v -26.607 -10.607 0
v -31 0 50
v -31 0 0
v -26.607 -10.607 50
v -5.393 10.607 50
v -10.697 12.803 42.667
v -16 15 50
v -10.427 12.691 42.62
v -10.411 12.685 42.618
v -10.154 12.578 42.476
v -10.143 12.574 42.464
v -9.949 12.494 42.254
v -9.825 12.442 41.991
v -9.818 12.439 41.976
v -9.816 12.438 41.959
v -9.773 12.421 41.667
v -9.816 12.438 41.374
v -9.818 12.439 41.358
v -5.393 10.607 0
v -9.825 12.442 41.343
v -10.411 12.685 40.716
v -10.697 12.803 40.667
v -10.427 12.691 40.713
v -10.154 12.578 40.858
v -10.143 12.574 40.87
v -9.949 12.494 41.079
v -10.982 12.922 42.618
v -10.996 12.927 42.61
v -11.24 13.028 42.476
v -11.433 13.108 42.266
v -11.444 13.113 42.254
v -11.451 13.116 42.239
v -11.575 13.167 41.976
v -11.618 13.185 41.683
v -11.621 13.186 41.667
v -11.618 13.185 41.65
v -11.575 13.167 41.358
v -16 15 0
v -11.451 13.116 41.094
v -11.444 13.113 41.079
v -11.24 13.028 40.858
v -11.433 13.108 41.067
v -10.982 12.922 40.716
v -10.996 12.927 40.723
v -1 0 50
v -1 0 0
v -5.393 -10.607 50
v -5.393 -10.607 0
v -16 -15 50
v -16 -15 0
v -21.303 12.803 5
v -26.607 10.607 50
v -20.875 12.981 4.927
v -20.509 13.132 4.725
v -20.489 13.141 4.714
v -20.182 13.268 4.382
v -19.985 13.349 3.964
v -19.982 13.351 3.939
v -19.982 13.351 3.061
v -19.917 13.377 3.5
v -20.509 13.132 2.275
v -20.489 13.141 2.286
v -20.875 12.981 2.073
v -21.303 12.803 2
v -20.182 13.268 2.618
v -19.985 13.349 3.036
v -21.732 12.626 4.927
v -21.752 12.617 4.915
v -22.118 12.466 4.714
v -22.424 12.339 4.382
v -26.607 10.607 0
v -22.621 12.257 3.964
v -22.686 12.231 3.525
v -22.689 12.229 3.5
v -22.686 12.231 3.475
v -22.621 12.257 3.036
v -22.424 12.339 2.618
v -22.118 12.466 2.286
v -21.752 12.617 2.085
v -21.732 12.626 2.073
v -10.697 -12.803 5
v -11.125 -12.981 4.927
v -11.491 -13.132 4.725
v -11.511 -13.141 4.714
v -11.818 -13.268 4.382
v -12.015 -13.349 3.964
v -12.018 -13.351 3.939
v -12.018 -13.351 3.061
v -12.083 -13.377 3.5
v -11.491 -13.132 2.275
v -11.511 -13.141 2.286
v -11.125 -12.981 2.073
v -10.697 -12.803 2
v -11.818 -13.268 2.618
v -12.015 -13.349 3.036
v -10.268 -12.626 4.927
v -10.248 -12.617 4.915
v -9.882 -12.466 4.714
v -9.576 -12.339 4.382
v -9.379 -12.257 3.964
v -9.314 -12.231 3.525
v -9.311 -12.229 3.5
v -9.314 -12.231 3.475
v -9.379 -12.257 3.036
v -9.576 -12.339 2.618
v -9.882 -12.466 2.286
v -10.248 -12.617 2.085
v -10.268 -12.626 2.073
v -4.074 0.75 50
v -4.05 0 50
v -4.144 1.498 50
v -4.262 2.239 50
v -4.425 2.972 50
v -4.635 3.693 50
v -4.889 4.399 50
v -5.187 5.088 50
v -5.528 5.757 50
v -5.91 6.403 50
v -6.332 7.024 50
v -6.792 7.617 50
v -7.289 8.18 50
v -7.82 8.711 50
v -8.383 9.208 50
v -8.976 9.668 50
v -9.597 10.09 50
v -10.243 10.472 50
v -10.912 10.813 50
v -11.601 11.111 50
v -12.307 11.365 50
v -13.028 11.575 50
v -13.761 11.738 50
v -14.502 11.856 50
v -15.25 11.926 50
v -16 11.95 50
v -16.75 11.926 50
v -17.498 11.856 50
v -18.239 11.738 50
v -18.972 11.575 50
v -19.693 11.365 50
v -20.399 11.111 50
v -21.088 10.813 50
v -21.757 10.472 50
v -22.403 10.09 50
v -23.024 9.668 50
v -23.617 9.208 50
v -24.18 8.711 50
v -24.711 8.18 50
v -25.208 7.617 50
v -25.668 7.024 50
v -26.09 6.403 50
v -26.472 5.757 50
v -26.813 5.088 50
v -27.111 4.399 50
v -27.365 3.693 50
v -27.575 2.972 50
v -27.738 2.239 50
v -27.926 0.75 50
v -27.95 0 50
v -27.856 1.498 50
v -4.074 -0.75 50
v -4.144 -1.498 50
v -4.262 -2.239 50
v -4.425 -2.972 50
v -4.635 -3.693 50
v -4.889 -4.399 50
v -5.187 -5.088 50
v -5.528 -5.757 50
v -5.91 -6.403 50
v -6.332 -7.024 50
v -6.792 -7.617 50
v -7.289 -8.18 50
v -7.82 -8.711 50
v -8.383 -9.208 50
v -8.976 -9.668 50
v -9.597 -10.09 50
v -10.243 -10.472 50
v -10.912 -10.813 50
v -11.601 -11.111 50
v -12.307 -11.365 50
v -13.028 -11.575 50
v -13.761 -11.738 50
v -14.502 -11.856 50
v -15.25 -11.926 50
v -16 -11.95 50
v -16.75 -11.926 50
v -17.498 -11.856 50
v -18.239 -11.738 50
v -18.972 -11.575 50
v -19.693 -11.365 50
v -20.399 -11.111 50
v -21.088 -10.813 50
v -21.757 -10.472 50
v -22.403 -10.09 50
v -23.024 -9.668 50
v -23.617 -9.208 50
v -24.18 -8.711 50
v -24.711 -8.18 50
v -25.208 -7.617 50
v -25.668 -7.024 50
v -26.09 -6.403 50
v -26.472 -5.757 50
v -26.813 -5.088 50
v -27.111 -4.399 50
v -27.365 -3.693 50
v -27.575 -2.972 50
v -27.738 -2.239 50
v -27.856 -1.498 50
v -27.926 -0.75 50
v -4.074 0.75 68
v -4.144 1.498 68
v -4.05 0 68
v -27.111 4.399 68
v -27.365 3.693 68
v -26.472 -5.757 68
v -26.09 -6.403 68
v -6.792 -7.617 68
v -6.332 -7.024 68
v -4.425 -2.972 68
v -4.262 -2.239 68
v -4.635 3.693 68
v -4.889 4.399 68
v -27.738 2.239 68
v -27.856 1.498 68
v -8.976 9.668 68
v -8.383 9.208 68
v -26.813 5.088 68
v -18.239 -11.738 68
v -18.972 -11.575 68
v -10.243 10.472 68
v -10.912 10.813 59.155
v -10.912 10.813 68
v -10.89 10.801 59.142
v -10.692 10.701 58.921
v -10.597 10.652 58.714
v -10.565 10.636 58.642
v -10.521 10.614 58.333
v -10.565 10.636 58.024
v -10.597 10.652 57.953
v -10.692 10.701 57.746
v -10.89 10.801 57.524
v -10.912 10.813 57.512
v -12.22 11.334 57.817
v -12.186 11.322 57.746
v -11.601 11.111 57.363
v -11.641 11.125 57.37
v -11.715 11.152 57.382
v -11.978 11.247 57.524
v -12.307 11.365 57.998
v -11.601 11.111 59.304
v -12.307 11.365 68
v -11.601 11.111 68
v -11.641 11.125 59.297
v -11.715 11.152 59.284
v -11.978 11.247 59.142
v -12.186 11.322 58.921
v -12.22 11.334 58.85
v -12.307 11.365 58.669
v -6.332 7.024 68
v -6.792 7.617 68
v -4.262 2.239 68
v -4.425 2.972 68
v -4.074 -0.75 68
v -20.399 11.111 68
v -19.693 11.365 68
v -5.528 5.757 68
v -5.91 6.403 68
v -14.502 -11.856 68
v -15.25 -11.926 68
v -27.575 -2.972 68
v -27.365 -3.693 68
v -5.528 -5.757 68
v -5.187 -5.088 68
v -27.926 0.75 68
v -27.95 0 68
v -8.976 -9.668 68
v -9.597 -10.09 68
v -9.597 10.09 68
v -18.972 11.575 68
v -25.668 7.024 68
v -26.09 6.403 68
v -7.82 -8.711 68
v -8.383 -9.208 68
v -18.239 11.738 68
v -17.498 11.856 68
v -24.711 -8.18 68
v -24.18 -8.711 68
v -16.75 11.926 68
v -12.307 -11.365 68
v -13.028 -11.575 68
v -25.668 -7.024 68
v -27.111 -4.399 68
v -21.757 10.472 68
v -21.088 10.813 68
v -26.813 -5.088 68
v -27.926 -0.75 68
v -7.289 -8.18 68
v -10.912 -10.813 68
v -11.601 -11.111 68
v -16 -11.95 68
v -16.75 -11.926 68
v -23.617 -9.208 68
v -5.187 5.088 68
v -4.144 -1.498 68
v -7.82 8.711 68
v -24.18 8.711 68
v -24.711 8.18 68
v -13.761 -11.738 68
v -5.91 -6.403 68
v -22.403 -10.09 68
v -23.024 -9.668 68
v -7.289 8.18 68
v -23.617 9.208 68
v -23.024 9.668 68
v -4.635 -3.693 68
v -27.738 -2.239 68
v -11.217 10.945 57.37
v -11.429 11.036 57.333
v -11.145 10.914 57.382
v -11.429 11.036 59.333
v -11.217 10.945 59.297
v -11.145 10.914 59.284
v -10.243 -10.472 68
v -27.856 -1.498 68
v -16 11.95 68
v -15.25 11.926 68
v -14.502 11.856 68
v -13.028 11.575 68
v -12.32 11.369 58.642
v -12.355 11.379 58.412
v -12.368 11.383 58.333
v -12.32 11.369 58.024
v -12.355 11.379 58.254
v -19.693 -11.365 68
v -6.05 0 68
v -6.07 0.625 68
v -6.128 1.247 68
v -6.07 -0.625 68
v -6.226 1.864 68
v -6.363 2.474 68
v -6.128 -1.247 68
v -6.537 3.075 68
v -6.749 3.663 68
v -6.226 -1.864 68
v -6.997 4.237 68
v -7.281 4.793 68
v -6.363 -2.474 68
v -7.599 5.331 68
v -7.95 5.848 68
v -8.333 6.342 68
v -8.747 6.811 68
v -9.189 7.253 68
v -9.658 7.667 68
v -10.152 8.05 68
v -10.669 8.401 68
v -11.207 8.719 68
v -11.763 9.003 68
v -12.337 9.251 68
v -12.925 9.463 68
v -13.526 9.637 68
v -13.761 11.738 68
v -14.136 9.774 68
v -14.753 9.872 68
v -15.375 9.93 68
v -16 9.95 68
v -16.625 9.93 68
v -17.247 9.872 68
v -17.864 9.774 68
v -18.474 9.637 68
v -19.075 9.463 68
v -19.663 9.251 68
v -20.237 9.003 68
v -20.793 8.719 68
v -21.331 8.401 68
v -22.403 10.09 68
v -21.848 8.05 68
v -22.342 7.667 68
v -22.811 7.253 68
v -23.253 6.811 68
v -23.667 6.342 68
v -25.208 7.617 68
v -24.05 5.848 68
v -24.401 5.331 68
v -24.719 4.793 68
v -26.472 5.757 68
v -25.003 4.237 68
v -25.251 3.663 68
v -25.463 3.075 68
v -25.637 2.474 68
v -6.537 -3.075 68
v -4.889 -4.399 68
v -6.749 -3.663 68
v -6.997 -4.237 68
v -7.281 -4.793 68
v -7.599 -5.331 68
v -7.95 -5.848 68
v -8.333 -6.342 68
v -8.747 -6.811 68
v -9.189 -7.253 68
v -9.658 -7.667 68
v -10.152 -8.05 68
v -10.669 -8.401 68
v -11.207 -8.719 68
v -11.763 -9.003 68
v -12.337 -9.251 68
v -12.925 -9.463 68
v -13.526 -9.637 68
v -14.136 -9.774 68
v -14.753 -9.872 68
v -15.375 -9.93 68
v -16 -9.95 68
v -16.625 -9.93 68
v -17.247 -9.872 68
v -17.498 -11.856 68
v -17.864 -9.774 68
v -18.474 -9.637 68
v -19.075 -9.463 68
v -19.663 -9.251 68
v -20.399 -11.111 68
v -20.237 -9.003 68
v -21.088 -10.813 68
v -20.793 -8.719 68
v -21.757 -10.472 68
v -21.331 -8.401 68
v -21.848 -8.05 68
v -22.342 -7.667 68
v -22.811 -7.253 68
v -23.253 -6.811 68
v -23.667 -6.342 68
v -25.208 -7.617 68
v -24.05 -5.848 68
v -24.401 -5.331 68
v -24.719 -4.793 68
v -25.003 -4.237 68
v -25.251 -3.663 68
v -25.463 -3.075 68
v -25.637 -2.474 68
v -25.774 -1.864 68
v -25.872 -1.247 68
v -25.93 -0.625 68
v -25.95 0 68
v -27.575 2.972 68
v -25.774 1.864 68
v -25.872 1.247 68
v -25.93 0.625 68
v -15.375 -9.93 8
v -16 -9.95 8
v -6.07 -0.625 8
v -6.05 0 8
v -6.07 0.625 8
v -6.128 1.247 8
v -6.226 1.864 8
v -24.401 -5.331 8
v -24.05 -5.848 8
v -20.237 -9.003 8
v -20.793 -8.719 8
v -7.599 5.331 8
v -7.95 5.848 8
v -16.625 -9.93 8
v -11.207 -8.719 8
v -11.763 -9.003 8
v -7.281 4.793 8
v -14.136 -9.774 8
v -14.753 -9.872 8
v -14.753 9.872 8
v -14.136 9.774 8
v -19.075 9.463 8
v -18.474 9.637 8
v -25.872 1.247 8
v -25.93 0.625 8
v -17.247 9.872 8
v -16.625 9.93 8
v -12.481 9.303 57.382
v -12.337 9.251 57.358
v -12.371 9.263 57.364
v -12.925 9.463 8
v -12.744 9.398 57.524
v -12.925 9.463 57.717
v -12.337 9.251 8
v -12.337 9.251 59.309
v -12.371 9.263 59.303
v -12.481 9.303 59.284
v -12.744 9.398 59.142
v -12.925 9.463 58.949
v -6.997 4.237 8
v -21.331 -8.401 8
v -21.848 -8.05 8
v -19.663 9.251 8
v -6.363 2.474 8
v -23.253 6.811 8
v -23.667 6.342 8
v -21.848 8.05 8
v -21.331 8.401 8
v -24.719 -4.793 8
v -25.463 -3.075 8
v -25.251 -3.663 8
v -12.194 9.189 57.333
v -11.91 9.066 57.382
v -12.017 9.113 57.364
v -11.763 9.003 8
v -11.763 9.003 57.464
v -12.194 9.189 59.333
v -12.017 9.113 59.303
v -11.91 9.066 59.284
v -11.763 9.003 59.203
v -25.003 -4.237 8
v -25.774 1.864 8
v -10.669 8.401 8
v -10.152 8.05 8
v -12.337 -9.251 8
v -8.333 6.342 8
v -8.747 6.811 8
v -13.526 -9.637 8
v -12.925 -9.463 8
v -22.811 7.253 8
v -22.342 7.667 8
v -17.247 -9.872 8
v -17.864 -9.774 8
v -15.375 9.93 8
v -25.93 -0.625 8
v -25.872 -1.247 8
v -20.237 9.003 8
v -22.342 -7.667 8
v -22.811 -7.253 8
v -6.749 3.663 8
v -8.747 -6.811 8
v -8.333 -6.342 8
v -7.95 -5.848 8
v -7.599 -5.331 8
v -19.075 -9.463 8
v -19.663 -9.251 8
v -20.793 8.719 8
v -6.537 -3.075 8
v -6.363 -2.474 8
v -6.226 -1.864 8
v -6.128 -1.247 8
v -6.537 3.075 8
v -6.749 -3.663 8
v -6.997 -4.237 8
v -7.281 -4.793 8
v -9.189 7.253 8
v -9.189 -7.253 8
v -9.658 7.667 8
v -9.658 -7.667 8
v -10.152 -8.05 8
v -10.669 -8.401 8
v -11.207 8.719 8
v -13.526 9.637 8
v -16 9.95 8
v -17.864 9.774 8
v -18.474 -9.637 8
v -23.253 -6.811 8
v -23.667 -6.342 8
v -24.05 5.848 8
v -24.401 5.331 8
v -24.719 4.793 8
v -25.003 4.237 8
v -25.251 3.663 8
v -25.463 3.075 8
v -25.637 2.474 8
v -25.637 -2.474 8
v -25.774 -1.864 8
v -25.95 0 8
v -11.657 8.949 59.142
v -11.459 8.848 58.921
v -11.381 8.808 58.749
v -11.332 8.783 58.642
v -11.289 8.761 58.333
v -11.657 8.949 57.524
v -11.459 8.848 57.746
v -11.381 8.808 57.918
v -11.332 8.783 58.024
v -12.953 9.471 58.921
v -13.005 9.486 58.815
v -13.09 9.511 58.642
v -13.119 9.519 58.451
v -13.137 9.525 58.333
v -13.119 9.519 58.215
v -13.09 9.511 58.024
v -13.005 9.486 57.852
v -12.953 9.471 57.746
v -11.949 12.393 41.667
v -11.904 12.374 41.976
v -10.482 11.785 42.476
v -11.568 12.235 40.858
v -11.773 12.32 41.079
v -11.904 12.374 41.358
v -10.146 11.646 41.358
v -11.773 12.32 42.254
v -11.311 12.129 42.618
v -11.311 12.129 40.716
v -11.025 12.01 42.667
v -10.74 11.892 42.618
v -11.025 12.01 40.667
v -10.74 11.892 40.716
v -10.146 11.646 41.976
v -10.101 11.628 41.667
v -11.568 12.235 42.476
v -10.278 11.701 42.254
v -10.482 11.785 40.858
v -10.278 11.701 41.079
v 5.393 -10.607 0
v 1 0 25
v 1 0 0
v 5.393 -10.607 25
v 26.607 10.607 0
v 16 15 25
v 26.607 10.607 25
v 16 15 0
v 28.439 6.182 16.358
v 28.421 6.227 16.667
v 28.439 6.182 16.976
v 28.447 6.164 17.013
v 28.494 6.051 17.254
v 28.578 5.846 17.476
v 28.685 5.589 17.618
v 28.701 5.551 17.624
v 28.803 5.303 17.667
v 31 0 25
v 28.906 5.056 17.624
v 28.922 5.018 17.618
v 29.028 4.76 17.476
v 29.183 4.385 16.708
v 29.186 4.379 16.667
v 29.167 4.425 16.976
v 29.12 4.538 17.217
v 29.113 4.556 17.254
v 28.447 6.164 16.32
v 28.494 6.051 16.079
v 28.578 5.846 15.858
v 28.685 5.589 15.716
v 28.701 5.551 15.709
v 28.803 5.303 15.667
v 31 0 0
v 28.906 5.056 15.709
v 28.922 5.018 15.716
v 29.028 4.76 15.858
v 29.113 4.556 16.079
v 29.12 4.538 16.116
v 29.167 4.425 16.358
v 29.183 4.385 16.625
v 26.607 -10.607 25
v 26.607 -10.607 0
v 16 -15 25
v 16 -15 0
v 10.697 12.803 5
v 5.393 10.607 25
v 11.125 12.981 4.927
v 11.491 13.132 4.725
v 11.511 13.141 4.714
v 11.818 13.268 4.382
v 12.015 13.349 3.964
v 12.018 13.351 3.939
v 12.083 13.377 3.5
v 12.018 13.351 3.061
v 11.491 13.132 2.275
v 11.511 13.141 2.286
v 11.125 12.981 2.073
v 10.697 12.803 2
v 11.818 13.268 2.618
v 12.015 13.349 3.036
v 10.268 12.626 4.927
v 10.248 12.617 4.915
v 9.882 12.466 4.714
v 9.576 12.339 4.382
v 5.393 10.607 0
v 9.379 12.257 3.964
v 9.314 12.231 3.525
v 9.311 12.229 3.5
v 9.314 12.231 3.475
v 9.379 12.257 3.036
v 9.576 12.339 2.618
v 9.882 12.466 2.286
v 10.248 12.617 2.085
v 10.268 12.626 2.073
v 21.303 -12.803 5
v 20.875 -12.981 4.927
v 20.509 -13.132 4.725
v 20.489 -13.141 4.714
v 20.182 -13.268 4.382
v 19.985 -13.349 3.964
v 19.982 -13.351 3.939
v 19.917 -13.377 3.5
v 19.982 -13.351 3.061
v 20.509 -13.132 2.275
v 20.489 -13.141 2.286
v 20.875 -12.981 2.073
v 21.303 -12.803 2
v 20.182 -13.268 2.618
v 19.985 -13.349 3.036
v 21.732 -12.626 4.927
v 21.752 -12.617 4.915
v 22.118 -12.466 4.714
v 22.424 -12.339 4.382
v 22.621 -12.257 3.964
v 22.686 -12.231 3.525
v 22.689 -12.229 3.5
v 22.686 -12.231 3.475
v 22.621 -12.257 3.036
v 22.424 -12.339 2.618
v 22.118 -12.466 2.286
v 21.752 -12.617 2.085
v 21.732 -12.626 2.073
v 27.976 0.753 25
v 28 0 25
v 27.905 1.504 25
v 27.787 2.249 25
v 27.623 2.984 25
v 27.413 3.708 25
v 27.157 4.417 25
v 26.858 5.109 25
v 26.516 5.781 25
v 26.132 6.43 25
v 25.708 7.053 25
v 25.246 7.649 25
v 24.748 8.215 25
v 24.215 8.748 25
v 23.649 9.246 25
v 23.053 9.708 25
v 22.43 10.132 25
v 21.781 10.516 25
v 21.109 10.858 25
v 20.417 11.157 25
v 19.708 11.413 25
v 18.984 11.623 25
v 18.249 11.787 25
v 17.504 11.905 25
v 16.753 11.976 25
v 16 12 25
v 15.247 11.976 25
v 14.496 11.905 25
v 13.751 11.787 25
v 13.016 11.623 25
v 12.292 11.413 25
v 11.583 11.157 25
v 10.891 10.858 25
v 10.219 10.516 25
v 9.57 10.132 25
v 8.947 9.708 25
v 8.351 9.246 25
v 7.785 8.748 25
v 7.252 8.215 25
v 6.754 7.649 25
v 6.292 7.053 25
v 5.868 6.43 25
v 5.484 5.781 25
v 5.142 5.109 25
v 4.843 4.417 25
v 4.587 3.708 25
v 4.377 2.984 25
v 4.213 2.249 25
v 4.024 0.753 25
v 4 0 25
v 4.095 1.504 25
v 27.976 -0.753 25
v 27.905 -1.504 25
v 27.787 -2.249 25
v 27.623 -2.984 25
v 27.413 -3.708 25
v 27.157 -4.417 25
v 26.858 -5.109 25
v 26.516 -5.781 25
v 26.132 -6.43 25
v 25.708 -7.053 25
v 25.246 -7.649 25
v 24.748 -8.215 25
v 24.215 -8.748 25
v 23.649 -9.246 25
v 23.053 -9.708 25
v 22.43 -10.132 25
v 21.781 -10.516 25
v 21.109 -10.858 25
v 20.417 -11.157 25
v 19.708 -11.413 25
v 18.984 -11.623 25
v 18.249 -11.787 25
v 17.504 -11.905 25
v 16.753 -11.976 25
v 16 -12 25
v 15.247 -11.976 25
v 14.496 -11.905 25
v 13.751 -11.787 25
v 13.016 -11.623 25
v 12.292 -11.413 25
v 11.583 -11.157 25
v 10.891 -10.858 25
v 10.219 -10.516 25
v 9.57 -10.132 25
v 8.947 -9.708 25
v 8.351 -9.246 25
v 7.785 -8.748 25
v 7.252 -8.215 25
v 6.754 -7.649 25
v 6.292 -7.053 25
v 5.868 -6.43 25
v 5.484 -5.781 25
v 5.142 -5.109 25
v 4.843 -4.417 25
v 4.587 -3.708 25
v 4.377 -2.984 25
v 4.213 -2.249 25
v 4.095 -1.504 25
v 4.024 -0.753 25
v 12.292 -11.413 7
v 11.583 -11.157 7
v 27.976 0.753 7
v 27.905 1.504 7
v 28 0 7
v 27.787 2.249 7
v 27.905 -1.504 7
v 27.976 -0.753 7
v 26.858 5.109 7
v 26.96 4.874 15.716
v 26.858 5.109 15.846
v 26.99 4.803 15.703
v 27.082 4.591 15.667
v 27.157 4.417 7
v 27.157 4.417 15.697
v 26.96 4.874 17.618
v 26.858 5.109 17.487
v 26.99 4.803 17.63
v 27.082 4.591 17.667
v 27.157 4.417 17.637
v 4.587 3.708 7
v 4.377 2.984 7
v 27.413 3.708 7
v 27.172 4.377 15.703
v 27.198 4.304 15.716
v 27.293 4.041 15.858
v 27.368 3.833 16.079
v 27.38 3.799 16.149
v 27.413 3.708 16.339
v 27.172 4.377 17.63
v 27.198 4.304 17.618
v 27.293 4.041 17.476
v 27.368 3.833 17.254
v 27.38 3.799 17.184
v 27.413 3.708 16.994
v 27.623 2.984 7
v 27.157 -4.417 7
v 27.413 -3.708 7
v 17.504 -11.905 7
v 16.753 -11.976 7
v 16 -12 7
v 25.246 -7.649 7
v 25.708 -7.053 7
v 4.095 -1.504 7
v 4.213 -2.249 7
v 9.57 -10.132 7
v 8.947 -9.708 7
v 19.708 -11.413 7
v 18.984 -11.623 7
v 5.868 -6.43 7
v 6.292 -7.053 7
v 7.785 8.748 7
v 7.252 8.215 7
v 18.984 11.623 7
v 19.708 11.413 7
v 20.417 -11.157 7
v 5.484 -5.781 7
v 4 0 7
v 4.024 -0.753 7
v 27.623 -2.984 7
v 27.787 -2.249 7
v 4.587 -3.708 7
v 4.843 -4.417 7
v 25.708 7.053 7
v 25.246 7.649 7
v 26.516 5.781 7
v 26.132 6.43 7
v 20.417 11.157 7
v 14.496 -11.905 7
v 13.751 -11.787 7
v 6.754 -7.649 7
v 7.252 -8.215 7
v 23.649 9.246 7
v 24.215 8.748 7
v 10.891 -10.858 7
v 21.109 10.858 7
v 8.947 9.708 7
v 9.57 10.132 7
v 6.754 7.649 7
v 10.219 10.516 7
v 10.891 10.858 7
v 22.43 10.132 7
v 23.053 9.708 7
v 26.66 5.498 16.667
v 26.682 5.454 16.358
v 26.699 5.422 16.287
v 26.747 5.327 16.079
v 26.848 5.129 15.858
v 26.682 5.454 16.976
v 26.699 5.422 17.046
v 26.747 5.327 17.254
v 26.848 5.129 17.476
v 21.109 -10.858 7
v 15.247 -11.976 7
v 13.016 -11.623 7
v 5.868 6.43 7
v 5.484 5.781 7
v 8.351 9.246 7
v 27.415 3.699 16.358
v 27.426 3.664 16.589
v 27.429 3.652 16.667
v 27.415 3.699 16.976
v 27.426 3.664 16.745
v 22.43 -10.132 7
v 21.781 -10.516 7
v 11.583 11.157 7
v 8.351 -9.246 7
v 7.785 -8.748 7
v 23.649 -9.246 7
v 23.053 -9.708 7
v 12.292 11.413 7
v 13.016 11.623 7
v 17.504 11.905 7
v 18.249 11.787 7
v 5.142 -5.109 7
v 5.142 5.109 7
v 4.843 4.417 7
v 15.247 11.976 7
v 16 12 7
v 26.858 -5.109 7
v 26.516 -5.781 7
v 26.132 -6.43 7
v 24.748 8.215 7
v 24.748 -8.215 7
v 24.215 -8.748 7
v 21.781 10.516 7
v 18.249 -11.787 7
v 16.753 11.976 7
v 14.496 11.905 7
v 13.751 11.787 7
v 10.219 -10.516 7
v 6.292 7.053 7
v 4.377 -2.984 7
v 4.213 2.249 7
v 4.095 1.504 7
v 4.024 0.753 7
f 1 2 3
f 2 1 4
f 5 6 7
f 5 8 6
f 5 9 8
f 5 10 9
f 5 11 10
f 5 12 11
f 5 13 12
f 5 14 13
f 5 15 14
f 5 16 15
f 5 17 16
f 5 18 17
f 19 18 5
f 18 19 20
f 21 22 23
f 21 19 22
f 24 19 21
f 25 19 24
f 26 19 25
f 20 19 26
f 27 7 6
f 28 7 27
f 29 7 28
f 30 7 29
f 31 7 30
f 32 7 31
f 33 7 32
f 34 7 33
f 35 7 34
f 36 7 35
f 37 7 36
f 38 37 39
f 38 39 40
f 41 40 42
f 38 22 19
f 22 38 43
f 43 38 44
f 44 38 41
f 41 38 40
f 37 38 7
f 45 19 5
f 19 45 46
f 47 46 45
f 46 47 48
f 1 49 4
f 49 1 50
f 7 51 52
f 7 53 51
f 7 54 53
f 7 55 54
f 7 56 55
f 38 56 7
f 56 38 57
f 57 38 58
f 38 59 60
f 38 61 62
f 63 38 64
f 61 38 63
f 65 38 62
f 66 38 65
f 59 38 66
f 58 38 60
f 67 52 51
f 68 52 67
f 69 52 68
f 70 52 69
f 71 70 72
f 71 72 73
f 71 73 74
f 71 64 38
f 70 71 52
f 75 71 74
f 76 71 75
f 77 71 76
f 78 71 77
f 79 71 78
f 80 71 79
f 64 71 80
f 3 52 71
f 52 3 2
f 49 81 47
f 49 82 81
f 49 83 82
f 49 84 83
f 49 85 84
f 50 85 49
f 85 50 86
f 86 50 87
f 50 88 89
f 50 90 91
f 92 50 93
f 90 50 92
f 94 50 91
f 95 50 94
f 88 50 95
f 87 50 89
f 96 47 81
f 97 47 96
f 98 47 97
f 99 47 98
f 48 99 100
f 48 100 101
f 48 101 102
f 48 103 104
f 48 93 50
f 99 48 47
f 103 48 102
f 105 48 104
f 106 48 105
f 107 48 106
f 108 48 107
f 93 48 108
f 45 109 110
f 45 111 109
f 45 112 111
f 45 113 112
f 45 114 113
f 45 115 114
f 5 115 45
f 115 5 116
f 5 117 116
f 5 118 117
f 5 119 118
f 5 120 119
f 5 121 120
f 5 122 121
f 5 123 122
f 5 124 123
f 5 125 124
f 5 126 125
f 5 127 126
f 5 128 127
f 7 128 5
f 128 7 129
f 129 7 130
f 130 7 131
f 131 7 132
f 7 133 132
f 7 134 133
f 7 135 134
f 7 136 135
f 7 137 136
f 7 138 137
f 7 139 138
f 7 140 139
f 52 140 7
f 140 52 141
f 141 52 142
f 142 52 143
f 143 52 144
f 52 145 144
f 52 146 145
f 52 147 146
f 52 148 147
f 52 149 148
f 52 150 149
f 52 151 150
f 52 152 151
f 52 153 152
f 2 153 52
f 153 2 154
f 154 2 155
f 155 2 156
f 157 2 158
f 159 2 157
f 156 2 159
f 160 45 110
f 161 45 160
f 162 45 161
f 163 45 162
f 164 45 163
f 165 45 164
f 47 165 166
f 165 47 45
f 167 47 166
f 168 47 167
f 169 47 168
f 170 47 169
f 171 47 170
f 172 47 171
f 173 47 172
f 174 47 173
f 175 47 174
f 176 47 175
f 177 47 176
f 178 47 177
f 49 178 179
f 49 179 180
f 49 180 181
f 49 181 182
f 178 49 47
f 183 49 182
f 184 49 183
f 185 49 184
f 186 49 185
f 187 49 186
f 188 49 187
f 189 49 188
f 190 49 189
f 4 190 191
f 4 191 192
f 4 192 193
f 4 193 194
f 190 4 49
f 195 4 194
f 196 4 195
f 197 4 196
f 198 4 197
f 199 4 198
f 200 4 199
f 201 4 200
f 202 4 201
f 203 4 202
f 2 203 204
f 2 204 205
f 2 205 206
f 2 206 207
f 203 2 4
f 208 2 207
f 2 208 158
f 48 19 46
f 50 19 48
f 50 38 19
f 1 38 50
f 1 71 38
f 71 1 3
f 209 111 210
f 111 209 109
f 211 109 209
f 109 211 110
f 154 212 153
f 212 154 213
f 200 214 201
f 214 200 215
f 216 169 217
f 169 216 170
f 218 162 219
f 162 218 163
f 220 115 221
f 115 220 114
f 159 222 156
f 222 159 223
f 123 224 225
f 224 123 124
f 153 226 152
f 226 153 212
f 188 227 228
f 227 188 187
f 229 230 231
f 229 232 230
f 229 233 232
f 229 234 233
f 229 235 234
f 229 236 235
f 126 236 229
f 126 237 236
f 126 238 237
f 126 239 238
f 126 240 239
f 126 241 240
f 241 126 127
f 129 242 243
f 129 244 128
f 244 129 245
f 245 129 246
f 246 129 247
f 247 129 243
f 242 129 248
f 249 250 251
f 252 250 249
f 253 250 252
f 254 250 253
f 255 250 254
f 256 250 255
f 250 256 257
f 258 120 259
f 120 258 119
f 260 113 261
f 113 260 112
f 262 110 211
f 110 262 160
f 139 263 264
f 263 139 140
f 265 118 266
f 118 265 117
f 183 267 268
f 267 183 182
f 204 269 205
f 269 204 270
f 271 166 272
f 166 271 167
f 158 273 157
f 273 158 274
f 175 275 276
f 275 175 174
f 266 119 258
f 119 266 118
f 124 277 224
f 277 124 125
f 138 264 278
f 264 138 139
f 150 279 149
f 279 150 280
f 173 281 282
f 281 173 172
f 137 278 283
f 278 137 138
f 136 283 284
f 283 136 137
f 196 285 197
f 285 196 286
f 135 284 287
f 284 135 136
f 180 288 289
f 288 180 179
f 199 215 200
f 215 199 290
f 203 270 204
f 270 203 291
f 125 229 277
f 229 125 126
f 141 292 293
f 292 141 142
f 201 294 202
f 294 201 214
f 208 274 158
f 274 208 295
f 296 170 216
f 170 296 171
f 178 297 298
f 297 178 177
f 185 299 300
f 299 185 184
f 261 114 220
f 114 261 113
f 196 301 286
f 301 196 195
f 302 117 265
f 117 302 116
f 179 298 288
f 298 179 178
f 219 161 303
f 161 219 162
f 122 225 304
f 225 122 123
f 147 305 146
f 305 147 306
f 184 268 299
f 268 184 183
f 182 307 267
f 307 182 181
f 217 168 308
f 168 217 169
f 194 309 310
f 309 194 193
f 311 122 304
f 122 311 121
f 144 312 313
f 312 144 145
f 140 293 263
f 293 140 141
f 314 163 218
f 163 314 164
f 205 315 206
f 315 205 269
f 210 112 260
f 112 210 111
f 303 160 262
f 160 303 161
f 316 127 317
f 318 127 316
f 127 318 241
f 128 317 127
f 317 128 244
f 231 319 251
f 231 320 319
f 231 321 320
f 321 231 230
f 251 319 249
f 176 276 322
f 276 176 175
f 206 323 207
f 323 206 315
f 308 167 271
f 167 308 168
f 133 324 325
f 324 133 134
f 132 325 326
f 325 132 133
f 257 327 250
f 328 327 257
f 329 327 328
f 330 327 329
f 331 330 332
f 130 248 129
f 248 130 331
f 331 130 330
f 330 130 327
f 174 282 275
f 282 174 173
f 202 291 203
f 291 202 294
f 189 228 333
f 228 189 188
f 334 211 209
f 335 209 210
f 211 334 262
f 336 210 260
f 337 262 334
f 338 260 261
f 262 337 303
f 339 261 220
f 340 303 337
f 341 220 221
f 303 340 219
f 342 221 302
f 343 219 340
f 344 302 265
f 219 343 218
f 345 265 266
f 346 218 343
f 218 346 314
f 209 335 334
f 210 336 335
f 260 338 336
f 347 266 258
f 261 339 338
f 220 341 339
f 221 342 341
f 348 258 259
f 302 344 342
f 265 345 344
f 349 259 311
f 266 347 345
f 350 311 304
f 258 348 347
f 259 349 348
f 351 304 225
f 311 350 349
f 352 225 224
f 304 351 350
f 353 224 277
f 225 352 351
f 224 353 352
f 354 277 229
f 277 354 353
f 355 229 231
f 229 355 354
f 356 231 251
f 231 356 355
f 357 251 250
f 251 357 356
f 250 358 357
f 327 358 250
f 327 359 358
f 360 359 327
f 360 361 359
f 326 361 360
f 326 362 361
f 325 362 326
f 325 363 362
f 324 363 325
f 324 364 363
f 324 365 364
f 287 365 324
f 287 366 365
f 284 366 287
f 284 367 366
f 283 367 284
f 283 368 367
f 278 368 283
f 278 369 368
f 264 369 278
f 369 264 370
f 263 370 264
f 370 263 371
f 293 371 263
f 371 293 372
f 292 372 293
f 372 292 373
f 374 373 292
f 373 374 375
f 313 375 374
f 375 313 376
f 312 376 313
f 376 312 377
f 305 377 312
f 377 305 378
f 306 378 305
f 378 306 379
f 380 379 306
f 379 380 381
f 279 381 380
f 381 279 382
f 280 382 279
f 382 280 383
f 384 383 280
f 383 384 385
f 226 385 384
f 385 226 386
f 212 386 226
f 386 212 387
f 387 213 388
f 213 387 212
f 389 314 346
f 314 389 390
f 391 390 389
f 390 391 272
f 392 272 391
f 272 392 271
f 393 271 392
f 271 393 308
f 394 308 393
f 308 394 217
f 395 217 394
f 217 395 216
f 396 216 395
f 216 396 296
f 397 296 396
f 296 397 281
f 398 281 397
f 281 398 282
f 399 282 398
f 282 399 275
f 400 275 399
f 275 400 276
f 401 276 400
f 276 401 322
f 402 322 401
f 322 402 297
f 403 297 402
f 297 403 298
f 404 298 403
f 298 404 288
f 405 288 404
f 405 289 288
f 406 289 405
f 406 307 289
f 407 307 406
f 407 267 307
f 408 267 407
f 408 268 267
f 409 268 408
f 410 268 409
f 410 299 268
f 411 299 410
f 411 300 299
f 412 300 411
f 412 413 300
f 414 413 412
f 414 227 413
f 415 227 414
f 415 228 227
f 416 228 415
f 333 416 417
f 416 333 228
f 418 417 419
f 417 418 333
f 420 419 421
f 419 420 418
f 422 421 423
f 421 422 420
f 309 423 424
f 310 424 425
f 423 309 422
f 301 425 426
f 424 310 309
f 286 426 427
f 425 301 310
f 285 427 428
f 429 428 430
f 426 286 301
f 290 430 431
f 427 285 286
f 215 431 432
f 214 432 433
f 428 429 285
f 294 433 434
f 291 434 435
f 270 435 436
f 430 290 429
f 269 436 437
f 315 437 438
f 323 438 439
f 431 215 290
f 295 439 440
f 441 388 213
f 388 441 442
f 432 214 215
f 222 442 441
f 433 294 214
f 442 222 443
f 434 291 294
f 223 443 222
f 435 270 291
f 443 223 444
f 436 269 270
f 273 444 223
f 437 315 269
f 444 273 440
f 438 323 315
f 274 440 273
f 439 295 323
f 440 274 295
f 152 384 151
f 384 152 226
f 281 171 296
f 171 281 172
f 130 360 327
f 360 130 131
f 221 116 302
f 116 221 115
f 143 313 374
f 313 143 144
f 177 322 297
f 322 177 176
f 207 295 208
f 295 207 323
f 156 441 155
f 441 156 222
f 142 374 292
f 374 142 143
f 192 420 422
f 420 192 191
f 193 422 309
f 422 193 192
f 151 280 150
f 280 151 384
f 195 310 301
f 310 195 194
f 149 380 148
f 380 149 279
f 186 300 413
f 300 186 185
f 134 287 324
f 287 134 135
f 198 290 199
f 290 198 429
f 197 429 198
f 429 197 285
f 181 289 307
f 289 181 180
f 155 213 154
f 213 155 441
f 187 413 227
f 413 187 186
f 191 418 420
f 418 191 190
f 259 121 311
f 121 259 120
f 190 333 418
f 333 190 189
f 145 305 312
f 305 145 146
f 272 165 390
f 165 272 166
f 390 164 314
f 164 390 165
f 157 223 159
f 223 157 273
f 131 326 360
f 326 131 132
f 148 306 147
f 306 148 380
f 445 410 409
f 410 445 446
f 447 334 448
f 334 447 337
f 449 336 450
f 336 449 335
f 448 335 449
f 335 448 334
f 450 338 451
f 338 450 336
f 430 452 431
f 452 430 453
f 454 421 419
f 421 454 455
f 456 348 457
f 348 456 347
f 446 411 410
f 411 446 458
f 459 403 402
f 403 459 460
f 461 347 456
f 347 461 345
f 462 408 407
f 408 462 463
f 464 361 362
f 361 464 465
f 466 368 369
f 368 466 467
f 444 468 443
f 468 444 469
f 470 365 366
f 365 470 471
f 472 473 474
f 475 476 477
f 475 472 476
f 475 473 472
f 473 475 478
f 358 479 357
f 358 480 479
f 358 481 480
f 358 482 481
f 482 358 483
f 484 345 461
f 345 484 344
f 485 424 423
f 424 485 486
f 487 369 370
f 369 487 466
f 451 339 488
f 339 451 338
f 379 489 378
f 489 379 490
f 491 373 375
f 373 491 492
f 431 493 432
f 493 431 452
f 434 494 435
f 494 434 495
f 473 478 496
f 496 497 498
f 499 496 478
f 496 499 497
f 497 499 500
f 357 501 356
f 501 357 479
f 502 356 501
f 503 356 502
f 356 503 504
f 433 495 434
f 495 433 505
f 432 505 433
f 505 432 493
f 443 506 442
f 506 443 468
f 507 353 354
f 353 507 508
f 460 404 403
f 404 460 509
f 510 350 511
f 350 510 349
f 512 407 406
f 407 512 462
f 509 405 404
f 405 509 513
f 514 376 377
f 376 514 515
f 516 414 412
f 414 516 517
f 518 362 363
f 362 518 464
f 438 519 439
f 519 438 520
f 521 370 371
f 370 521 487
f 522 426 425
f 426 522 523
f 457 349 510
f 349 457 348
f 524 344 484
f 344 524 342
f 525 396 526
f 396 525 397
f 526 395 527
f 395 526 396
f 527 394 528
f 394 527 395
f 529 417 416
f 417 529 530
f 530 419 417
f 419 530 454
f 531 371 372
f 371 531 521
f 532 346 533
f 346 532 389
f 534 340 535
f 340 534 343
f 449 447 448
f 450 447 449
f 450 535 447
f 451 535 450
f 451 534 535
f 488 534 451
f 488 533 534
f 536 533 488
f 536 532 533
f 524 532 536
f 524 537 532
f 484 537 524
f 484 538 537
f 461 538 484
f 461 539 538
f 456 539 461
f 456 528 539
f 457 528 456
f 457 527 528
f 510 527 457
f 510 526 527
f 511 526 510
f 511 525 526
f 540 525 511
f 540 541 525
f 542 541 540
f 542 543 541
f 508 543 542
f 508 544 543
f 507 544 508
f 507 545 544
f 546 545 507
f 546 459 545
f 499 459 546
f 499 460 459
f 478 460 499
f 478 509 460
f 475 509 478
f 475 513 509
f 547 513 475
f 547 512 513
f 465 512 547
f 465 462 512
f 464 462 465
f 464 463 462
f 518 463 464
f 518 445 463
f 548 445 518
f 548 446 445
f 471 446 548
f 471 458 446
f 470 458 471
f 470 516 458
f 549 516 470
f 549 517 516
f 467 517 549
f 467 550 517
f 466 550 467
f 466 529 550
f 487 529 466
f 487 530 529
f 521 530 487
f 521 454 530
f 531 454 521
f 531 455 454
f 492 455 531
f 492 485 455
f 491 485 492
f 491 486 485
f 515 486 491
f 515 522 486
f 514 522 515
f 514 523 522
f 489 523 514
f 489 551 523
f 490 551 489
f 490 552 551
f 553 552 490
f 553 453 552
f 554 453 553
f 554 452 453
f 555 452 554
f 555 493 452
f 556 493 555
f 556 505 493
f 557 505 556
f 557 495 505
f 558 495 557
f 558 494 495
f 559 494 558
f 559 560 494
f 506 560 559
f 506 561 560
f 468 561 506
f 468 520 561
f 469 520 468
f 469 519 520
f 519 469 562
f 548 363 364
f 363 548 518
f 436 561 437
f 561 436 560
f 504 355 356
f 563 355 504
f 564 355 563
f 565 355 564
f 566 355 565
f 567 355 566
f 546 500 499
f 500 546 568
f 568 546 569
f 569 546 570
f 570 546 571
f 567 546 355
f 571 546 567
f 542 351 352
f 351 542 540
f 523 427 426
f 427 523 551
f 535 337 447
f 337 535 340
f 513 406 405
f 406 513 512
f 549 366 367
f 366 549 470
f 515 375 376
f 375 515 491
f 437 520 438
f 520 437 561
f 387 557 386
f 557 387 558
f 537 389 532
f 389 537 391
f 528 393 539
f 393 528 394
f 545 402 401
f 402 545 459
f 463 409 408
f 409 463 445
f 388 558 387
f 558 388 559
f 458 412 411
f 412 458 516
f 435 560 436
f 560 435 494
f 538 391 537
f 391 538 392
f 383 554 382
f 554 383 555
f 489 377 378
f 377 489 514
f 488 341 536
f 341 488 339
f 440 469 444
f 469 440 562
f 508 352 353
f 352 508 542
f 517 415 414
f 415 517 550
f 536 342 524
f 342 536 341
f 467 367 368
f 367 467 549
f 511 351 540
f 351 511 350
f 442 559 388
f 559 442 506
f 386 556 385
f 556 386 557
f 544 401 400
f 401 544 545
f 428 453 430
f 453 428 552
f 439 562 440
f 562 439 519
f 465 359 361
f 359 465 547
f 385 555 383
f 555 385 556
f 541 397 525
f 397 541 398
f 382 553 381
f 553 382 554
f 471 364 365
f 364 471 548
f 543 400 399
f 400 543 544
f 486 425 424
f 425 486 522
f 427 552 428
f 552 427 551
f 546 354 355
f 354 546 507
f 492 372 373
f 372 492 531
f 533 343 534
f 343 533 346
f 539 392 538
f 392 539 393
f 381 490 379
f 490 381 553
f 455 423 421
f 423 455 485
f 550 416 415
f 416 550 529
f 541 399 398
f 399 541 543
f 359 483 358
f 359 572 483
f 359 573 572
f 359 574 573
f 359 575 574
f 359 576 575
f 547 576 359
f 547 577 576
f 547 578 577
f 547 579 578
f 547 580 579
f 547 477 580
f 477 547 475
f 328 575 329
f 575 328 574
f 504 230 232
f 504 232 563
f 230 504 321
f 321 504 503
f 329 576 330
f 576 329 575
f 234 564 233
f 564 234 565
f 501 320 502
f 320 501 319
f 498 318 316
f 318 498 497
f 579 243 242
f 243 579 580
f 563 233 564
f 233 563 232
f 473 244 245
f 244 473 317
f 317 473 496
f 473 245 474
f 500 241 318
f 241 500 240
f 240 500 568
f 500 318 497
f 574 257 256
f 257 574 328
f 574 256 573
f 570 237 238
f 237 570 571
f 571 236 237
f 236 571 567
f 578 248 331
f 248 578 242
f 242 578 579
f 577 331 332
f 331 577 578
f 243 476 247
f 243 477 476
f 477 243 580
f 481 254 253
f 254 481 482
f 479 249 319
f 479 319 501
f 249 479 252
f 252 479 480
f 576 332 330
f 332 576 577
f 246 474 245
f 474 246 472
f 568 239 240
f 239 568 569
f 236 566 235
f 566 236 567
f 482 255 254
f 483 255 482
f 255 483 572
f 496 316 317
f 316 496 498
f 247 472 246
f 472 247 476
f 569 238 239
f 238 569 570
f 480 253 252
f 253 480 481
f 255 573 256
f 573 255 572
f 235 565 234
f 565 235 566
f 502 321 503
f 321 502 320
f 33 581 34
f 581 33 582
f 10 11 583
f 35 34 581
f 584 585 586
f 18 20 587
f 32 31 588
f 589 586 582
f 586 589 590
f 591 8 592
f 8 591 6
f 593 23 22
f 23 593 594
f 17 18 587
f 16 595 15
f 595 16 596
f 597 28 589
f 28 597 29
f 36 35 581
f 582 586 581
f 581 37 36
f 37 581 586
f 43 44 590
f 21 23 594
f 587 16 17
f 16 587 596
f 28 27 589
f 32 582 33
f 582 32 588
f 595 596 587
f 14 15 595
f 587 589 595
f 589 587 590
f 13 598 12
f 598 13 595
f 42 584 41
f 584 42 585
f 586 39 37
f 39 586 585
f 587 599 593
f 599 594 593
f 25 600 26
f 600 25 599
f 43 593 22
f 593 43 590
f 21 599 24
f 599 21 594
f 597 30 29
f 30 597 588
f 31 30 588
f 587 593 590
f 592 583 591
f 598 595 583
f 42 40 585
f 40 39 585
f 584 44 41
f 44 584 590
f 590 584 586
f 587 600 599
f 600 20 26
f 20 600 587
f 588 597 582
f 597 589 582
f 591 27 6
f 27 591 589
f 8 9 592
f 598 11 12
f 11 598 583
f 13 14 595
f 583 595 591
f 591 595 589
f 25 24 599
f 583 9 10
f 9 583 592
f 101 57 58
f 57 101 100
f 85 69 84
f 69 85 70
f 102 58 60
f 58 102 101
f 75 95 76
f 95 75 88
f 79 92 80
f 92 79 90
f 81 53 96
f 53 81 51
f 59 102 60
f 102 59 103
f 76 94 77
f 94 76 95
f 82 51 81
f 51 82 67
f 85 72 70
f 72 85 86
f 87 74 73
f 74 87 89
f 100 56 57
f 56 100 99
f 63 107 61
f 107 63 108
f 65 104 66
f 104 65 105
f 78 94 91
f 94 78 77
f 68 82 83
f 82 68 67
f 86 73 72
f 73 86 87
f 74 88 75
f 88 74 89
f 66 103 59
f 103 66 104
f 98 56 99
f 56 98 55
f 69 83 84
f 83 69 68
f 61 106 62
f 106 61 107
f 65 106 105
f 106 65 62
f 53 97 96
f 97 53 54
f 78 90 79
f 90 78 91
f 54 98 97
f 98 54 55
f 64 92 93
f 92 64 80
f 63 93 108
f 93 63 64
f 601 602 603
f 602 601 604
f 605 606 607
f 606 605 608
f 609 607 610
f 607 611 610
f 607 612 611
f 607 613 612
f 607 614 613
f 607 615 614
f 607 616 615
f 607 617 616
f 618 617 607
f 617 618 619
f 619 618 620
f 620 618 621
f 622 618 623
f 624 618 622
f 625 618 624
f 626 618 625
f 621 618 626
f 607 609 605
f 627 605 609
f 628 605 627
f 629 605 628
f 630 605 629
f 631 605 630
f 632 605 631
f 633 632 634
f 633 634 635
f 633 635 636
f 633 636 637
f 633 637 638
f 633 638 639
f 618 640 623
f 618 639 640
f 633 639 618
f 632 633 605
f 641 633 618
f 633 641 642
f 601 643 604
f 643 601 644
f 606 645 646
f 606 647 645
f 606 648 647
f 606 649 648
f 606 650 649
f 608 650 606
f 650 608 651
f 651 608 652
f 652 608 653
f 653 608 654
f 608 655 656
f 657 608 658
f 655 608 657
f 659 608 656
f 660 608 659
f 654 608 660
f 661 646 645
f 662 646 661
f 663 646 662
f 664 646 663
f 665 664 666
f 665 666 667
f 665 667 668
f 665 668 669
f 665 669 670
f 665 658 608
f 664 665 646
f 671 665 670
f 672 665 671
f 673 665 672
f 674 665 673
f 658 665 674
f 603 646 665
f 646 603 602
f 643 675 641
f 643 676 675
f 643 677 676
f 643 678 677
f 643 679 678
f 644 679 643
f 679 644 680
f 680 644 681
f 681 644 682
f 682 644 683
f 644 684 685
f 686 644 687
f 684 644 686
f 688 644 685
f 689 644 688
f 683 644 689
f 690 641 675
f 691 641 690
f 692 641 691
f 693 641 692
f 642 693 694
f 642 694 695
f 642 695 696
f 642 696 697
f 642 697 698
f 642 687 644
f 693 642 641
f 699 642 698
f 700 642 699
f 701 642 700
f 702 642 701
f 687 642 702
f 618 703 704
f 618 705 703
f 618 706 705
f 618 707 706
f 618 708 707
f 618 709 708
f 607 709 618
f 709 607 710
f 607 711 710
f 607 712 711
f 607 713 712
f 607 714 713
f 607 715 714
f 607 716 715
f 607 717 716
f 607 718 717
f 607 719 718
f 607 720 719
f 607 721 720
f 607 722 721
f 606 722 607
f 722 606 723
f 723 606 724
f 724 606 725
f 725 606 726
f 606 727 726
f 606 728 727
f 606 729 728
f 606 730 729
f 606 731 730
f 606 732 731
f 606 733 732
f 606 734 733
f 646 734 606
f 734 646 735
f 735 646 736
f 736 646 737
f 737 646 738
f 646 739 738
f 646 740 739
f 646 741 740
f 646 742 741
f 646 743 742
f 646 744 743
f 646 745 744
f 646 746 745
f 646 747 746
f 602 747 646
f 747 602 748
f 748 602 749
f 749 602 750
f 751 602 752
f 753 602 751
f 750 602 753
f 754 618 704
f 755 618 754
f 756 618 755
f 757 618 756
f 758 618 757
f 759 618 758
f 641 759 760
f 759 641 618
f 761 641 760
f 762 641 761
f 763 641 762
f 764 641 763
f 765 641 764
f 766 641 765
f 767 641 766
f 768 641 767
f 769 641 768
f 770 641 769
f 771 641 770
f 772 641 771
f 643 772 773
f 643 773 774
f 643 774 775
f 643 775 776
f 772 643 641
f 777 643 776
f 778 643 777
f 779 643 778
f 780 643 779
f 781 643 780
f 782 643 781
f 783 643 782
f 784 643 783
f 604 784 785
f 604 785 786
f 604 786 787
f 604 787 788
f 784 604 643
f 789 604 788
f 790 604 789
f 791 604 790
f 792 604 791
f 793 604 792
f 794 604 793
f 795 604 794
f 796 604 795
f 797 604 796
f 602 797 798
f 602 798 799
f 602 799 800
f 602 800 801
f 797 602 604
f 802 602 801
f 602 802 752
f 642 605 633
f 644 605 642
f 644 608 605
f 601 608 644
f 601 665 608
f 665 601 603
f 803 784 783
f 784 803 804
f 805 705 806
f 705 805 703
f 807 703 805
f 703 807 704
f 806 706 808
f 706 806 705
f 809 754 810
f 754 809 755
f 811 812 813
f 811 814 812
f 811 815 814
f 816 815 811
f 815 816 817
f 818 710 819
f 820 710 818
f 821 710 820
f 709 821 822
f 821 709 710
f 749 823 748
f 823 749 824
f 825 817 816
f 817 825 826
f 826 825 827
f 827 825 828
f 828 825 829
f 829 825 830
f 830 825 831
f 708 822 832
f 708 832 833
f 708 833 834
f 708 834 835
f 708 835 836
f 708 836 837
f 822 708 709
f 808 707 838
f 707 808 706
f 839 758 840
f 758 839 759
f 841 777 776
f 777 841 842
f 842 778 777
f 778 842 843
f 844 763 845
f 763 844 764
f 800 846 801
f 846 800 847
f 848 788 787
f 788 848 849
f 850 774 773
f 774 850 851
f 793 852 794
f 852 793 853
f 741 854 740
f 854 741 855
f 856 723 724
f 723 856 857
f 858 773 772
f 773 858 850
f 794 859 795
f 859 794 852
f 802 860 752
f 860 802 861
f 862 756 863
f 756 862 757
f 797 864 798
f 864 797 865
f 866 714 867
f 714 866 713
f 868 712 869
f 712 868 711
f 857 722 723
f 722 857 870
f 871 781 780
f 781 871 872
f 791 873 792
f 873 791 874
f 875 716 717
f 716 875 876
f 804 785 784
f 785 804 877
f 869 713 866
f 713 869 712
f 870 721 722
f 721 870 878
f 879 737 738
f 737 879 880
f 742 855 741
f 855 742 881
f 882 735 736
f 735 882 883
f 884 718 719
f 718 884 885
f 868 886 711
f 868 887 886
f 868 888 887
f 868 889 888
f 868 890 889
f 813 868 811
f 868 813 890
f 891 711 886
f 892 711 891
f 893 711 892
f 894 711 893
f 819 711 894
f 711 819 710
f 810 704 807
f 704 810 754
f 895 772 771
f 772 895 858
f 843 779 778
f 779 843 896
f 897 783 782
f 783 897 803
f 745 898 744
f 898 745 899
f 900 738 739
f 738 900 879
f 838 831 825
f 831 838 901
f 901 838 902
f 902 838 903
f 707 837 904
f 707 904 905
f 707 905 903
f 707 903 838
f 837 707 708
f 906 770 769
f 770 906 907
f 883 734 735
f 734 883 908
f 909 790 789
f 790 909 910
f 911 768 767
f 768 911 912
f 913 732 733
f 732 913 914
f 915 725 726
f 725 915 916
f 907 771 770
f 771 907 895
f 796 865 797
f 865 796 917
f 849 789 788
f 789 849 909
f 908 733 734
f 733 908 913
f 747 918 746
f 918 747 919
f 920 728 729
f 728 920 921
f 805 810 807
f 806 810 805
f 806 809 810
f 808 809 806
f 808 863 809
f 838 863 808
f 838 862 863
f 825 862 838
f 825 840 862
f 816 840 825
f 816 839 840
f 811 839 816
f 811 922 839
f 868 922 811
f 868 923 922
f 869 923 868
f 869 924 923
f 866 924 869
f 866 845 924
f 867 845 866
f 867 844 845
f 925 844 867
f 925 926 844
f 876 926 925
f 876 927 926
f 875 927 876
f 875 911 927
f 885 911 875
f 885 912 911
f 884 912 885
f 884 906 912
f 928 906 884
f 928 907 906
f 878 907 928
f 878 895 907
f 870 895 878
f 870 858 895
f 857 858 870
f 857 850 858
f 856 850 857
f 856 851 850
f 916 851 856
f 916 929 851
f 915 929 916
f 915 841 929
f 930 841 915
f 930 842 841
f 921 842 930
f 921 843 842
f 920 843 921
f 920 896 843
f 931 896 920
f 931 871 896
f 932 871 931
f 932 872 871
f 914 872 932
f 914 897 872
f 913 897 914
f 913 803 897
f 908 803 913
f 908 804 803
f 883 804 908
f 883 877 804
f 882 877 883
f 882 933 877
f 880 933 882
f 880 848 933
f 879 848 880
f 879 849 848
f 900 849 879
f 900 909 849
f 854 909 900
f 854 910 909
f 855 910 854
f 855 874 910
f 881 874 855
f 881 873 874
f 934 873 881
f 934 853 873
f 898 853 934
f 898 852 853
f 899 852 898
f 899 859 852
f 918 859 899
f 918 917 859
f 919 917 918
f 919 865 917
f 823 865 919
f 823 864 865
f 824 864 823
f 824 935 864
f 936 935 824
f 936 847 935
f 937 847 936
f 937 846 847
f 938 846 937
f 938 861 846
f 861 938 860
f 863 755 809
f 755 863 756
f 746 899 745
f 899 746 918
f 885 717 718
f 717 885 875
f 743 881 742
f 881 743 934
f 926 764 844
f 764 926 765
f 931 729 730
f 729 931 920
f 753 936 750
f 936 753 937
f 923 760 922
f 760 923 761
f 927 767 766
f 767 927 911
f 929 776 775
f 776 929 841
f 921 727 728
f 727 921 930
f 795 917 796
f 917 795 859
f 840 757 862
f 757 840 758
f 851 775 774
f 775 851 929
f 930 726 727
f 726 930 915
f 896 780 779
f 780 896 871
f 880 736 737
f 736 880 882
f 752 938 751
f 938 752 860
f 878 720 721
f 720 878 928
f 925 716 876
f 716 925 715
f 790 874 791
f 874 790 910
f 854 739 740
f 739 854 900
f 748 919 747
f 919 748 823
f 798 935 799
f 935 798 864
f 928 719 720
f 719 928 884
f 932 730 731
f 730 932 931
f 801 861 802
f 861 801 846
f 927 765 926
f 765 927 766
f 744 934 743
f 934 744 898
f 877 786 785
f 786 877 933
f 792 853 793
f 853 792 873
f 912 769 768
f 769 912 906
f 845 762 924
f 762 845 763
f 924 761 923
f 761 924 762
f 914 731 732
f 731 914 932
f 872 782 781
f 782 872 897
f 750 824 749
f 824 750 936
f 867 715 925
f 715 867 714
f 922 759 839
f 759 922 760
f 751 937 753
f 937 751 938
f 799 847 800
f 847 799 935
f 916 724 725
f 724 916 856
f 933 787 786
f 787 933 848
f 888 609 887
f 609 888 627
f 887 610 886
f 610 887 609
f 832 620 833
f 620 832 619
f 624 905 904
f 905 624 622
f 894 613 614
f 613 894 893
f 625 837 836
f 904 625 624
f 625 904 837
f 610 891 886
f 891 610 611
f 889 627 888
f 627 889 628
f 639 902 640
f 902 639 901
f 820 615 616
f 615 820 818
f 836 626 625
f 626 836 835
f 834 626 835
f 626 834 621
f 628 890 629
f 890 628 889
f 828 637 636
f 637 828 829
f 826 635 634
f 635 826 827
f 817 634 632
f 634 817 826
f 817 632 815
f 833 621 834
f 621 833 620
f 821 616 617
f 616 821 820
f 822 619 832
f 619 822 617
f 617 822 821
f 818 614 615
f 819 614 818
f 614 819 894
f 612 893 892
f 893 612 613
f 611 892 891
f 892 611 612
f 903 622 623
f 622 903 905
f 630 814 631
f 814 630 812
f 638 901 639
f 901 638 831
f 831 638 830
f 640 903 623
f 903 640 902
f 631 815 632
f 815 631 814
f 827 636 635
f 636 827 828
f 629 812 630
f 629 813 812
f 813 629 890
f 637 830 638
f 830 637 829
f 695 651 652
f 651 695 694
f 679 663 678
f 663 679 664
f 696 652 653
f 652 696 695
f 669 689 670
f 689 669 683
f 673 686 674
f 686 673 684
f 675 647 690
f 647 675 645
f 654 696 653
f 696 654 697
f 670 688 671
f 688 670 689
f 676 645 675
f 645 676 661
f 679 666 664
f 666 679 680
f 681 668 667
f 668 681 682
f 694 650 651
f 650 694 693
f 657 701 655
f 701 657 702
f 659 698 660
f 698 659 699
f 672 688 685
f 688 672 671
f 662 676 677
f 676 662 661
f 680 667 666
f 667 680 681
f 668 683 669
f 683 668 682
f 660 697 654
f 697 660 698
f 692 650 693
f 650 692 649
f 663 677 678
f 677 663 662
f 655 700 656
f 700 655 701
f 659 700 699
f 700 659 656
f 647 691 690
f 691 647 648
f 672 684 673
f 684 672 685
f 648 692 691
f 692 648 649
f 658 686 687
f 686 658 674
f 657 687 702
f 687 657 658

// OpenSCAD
// Which parts would you like to see?
part = "both"; // [container:Container Only,lid:Lid Only,both:Both Container and Lid]

// What type of container would you like to make?
variant = 30; // [22:Giriko-ire(22mm),30:Fudeko-ire(30mm),35:Large Fudeko-ire(35mm)]
variant_radius=variant/2;

// How many sides?
shape = 8; // [8:Eight sides,12:Twelve sides,100:Round]

// How thick should the walls be? (mm)
wall_thickness = 2; // [1:4]

// Diameter of the string hole. (mm)
string_hole_diameter = 3; // [0:No hole,1:1mm,1.5:1.5mm,2:2mm,3:3mm,4:4mm,5:5mm]

// Diameter of the hole.
hole_diameter = 2; // [0:No hole,1:1mm,1.5:1.5mm,2:2mm,3:3mm,4:4mm,5:5mm]

// How much tolerance between the lid and container?
tolerance = 0.05; // [0.05,0.06,0.07,0.08,0.09,0.1,0.15,0.2,0.3,0.4,0.5]

angle_between_holes = shape==100?45:(360/shape);

half_angle_between_holes=angle_between_holes/2;

hole_radius = hole_diameter==0?0:hole_diameter/2;
string_hole_radius = string_hole_diameter==0?0:string_hole_diameter/2;

height = variant*2.5;
segment = height/3;
overlap = segment-(string_hole_diameter+4);


print_part();

module print_part() {
	if (part == "container") {
		container();
	} else if (part == "lid") {
		lid();
	} else if (part == "both") {
		both();
	} else {
		both();
	}
}

module both() {
	translate([-(variant_radius+1), 0, 0]) container();
	translate([variant_radius+1, 0, 0]) lid();
}

module container() {
	difference(){
		union(){
			//outer shape
			cylinder(r=variant_radius, h=segment*2, $fn=shape); 
			//overlap cylinder
			translate([0, 0, segment*2]) cylinder(r=variant_radius-(wall_thickness+1+tolerance), h=overlap, $fn=100);
		}
		// inside of container
		translate([0, 0, string_hole_diameter+5])cylinder(r=variant_radius-(wall_thickness+1+tolerance)-2, h=(segment*2)+overlap+2, $fn=100);
		// hole
		translate([0, 0, segment*2+(segment/3)]) rotate([90,0,half_angle_between_holes+angle_between_holes+90]) cylinder(r=hole_radius, h=variant_radius+1, $fn=20);
		// marker
		translate([0, 0, segment*2-(segment/3)]) rotate([90,0,half_angle_between_holes+angle_between_holes+90]) translate([0,0,variant_radius-2]) cylinder(r=hole_radius, h=variant_radius+1, $fn=20);
		// string hole
		translate([0, 0, string_hole_radius+2]) rotate([90,0,half_angle_between_holes]) cylinder(r=string_hole_radius, h=variant+1,center=true, $fn=20);

	}
}

module lid() {
	difference(){
		// outer shape
		cylinder(r=variant_radius, h=segment, $fn=shape);
		// cut-out cylinder
		translate([0, 0, string_hole_diameter+4]) cylinder(r=variant_radius-(wall_thickness+1), h=overlap+1, $fn=100);
		// hole 
		translate([0, 0, segment/3*2]) rotate([90,0,half_angle_between_holes+90]) cylinder(r=hole_radius, h=variant_radius+1, $fn=20);
		// string hole
		translate([0, 0, string_hole_radius+2]) rotate([90,0,half_angle_between_holes]) cylinder(r=string_hole_radius, h=variant+1,center=true, $fn=20);
	}
}

